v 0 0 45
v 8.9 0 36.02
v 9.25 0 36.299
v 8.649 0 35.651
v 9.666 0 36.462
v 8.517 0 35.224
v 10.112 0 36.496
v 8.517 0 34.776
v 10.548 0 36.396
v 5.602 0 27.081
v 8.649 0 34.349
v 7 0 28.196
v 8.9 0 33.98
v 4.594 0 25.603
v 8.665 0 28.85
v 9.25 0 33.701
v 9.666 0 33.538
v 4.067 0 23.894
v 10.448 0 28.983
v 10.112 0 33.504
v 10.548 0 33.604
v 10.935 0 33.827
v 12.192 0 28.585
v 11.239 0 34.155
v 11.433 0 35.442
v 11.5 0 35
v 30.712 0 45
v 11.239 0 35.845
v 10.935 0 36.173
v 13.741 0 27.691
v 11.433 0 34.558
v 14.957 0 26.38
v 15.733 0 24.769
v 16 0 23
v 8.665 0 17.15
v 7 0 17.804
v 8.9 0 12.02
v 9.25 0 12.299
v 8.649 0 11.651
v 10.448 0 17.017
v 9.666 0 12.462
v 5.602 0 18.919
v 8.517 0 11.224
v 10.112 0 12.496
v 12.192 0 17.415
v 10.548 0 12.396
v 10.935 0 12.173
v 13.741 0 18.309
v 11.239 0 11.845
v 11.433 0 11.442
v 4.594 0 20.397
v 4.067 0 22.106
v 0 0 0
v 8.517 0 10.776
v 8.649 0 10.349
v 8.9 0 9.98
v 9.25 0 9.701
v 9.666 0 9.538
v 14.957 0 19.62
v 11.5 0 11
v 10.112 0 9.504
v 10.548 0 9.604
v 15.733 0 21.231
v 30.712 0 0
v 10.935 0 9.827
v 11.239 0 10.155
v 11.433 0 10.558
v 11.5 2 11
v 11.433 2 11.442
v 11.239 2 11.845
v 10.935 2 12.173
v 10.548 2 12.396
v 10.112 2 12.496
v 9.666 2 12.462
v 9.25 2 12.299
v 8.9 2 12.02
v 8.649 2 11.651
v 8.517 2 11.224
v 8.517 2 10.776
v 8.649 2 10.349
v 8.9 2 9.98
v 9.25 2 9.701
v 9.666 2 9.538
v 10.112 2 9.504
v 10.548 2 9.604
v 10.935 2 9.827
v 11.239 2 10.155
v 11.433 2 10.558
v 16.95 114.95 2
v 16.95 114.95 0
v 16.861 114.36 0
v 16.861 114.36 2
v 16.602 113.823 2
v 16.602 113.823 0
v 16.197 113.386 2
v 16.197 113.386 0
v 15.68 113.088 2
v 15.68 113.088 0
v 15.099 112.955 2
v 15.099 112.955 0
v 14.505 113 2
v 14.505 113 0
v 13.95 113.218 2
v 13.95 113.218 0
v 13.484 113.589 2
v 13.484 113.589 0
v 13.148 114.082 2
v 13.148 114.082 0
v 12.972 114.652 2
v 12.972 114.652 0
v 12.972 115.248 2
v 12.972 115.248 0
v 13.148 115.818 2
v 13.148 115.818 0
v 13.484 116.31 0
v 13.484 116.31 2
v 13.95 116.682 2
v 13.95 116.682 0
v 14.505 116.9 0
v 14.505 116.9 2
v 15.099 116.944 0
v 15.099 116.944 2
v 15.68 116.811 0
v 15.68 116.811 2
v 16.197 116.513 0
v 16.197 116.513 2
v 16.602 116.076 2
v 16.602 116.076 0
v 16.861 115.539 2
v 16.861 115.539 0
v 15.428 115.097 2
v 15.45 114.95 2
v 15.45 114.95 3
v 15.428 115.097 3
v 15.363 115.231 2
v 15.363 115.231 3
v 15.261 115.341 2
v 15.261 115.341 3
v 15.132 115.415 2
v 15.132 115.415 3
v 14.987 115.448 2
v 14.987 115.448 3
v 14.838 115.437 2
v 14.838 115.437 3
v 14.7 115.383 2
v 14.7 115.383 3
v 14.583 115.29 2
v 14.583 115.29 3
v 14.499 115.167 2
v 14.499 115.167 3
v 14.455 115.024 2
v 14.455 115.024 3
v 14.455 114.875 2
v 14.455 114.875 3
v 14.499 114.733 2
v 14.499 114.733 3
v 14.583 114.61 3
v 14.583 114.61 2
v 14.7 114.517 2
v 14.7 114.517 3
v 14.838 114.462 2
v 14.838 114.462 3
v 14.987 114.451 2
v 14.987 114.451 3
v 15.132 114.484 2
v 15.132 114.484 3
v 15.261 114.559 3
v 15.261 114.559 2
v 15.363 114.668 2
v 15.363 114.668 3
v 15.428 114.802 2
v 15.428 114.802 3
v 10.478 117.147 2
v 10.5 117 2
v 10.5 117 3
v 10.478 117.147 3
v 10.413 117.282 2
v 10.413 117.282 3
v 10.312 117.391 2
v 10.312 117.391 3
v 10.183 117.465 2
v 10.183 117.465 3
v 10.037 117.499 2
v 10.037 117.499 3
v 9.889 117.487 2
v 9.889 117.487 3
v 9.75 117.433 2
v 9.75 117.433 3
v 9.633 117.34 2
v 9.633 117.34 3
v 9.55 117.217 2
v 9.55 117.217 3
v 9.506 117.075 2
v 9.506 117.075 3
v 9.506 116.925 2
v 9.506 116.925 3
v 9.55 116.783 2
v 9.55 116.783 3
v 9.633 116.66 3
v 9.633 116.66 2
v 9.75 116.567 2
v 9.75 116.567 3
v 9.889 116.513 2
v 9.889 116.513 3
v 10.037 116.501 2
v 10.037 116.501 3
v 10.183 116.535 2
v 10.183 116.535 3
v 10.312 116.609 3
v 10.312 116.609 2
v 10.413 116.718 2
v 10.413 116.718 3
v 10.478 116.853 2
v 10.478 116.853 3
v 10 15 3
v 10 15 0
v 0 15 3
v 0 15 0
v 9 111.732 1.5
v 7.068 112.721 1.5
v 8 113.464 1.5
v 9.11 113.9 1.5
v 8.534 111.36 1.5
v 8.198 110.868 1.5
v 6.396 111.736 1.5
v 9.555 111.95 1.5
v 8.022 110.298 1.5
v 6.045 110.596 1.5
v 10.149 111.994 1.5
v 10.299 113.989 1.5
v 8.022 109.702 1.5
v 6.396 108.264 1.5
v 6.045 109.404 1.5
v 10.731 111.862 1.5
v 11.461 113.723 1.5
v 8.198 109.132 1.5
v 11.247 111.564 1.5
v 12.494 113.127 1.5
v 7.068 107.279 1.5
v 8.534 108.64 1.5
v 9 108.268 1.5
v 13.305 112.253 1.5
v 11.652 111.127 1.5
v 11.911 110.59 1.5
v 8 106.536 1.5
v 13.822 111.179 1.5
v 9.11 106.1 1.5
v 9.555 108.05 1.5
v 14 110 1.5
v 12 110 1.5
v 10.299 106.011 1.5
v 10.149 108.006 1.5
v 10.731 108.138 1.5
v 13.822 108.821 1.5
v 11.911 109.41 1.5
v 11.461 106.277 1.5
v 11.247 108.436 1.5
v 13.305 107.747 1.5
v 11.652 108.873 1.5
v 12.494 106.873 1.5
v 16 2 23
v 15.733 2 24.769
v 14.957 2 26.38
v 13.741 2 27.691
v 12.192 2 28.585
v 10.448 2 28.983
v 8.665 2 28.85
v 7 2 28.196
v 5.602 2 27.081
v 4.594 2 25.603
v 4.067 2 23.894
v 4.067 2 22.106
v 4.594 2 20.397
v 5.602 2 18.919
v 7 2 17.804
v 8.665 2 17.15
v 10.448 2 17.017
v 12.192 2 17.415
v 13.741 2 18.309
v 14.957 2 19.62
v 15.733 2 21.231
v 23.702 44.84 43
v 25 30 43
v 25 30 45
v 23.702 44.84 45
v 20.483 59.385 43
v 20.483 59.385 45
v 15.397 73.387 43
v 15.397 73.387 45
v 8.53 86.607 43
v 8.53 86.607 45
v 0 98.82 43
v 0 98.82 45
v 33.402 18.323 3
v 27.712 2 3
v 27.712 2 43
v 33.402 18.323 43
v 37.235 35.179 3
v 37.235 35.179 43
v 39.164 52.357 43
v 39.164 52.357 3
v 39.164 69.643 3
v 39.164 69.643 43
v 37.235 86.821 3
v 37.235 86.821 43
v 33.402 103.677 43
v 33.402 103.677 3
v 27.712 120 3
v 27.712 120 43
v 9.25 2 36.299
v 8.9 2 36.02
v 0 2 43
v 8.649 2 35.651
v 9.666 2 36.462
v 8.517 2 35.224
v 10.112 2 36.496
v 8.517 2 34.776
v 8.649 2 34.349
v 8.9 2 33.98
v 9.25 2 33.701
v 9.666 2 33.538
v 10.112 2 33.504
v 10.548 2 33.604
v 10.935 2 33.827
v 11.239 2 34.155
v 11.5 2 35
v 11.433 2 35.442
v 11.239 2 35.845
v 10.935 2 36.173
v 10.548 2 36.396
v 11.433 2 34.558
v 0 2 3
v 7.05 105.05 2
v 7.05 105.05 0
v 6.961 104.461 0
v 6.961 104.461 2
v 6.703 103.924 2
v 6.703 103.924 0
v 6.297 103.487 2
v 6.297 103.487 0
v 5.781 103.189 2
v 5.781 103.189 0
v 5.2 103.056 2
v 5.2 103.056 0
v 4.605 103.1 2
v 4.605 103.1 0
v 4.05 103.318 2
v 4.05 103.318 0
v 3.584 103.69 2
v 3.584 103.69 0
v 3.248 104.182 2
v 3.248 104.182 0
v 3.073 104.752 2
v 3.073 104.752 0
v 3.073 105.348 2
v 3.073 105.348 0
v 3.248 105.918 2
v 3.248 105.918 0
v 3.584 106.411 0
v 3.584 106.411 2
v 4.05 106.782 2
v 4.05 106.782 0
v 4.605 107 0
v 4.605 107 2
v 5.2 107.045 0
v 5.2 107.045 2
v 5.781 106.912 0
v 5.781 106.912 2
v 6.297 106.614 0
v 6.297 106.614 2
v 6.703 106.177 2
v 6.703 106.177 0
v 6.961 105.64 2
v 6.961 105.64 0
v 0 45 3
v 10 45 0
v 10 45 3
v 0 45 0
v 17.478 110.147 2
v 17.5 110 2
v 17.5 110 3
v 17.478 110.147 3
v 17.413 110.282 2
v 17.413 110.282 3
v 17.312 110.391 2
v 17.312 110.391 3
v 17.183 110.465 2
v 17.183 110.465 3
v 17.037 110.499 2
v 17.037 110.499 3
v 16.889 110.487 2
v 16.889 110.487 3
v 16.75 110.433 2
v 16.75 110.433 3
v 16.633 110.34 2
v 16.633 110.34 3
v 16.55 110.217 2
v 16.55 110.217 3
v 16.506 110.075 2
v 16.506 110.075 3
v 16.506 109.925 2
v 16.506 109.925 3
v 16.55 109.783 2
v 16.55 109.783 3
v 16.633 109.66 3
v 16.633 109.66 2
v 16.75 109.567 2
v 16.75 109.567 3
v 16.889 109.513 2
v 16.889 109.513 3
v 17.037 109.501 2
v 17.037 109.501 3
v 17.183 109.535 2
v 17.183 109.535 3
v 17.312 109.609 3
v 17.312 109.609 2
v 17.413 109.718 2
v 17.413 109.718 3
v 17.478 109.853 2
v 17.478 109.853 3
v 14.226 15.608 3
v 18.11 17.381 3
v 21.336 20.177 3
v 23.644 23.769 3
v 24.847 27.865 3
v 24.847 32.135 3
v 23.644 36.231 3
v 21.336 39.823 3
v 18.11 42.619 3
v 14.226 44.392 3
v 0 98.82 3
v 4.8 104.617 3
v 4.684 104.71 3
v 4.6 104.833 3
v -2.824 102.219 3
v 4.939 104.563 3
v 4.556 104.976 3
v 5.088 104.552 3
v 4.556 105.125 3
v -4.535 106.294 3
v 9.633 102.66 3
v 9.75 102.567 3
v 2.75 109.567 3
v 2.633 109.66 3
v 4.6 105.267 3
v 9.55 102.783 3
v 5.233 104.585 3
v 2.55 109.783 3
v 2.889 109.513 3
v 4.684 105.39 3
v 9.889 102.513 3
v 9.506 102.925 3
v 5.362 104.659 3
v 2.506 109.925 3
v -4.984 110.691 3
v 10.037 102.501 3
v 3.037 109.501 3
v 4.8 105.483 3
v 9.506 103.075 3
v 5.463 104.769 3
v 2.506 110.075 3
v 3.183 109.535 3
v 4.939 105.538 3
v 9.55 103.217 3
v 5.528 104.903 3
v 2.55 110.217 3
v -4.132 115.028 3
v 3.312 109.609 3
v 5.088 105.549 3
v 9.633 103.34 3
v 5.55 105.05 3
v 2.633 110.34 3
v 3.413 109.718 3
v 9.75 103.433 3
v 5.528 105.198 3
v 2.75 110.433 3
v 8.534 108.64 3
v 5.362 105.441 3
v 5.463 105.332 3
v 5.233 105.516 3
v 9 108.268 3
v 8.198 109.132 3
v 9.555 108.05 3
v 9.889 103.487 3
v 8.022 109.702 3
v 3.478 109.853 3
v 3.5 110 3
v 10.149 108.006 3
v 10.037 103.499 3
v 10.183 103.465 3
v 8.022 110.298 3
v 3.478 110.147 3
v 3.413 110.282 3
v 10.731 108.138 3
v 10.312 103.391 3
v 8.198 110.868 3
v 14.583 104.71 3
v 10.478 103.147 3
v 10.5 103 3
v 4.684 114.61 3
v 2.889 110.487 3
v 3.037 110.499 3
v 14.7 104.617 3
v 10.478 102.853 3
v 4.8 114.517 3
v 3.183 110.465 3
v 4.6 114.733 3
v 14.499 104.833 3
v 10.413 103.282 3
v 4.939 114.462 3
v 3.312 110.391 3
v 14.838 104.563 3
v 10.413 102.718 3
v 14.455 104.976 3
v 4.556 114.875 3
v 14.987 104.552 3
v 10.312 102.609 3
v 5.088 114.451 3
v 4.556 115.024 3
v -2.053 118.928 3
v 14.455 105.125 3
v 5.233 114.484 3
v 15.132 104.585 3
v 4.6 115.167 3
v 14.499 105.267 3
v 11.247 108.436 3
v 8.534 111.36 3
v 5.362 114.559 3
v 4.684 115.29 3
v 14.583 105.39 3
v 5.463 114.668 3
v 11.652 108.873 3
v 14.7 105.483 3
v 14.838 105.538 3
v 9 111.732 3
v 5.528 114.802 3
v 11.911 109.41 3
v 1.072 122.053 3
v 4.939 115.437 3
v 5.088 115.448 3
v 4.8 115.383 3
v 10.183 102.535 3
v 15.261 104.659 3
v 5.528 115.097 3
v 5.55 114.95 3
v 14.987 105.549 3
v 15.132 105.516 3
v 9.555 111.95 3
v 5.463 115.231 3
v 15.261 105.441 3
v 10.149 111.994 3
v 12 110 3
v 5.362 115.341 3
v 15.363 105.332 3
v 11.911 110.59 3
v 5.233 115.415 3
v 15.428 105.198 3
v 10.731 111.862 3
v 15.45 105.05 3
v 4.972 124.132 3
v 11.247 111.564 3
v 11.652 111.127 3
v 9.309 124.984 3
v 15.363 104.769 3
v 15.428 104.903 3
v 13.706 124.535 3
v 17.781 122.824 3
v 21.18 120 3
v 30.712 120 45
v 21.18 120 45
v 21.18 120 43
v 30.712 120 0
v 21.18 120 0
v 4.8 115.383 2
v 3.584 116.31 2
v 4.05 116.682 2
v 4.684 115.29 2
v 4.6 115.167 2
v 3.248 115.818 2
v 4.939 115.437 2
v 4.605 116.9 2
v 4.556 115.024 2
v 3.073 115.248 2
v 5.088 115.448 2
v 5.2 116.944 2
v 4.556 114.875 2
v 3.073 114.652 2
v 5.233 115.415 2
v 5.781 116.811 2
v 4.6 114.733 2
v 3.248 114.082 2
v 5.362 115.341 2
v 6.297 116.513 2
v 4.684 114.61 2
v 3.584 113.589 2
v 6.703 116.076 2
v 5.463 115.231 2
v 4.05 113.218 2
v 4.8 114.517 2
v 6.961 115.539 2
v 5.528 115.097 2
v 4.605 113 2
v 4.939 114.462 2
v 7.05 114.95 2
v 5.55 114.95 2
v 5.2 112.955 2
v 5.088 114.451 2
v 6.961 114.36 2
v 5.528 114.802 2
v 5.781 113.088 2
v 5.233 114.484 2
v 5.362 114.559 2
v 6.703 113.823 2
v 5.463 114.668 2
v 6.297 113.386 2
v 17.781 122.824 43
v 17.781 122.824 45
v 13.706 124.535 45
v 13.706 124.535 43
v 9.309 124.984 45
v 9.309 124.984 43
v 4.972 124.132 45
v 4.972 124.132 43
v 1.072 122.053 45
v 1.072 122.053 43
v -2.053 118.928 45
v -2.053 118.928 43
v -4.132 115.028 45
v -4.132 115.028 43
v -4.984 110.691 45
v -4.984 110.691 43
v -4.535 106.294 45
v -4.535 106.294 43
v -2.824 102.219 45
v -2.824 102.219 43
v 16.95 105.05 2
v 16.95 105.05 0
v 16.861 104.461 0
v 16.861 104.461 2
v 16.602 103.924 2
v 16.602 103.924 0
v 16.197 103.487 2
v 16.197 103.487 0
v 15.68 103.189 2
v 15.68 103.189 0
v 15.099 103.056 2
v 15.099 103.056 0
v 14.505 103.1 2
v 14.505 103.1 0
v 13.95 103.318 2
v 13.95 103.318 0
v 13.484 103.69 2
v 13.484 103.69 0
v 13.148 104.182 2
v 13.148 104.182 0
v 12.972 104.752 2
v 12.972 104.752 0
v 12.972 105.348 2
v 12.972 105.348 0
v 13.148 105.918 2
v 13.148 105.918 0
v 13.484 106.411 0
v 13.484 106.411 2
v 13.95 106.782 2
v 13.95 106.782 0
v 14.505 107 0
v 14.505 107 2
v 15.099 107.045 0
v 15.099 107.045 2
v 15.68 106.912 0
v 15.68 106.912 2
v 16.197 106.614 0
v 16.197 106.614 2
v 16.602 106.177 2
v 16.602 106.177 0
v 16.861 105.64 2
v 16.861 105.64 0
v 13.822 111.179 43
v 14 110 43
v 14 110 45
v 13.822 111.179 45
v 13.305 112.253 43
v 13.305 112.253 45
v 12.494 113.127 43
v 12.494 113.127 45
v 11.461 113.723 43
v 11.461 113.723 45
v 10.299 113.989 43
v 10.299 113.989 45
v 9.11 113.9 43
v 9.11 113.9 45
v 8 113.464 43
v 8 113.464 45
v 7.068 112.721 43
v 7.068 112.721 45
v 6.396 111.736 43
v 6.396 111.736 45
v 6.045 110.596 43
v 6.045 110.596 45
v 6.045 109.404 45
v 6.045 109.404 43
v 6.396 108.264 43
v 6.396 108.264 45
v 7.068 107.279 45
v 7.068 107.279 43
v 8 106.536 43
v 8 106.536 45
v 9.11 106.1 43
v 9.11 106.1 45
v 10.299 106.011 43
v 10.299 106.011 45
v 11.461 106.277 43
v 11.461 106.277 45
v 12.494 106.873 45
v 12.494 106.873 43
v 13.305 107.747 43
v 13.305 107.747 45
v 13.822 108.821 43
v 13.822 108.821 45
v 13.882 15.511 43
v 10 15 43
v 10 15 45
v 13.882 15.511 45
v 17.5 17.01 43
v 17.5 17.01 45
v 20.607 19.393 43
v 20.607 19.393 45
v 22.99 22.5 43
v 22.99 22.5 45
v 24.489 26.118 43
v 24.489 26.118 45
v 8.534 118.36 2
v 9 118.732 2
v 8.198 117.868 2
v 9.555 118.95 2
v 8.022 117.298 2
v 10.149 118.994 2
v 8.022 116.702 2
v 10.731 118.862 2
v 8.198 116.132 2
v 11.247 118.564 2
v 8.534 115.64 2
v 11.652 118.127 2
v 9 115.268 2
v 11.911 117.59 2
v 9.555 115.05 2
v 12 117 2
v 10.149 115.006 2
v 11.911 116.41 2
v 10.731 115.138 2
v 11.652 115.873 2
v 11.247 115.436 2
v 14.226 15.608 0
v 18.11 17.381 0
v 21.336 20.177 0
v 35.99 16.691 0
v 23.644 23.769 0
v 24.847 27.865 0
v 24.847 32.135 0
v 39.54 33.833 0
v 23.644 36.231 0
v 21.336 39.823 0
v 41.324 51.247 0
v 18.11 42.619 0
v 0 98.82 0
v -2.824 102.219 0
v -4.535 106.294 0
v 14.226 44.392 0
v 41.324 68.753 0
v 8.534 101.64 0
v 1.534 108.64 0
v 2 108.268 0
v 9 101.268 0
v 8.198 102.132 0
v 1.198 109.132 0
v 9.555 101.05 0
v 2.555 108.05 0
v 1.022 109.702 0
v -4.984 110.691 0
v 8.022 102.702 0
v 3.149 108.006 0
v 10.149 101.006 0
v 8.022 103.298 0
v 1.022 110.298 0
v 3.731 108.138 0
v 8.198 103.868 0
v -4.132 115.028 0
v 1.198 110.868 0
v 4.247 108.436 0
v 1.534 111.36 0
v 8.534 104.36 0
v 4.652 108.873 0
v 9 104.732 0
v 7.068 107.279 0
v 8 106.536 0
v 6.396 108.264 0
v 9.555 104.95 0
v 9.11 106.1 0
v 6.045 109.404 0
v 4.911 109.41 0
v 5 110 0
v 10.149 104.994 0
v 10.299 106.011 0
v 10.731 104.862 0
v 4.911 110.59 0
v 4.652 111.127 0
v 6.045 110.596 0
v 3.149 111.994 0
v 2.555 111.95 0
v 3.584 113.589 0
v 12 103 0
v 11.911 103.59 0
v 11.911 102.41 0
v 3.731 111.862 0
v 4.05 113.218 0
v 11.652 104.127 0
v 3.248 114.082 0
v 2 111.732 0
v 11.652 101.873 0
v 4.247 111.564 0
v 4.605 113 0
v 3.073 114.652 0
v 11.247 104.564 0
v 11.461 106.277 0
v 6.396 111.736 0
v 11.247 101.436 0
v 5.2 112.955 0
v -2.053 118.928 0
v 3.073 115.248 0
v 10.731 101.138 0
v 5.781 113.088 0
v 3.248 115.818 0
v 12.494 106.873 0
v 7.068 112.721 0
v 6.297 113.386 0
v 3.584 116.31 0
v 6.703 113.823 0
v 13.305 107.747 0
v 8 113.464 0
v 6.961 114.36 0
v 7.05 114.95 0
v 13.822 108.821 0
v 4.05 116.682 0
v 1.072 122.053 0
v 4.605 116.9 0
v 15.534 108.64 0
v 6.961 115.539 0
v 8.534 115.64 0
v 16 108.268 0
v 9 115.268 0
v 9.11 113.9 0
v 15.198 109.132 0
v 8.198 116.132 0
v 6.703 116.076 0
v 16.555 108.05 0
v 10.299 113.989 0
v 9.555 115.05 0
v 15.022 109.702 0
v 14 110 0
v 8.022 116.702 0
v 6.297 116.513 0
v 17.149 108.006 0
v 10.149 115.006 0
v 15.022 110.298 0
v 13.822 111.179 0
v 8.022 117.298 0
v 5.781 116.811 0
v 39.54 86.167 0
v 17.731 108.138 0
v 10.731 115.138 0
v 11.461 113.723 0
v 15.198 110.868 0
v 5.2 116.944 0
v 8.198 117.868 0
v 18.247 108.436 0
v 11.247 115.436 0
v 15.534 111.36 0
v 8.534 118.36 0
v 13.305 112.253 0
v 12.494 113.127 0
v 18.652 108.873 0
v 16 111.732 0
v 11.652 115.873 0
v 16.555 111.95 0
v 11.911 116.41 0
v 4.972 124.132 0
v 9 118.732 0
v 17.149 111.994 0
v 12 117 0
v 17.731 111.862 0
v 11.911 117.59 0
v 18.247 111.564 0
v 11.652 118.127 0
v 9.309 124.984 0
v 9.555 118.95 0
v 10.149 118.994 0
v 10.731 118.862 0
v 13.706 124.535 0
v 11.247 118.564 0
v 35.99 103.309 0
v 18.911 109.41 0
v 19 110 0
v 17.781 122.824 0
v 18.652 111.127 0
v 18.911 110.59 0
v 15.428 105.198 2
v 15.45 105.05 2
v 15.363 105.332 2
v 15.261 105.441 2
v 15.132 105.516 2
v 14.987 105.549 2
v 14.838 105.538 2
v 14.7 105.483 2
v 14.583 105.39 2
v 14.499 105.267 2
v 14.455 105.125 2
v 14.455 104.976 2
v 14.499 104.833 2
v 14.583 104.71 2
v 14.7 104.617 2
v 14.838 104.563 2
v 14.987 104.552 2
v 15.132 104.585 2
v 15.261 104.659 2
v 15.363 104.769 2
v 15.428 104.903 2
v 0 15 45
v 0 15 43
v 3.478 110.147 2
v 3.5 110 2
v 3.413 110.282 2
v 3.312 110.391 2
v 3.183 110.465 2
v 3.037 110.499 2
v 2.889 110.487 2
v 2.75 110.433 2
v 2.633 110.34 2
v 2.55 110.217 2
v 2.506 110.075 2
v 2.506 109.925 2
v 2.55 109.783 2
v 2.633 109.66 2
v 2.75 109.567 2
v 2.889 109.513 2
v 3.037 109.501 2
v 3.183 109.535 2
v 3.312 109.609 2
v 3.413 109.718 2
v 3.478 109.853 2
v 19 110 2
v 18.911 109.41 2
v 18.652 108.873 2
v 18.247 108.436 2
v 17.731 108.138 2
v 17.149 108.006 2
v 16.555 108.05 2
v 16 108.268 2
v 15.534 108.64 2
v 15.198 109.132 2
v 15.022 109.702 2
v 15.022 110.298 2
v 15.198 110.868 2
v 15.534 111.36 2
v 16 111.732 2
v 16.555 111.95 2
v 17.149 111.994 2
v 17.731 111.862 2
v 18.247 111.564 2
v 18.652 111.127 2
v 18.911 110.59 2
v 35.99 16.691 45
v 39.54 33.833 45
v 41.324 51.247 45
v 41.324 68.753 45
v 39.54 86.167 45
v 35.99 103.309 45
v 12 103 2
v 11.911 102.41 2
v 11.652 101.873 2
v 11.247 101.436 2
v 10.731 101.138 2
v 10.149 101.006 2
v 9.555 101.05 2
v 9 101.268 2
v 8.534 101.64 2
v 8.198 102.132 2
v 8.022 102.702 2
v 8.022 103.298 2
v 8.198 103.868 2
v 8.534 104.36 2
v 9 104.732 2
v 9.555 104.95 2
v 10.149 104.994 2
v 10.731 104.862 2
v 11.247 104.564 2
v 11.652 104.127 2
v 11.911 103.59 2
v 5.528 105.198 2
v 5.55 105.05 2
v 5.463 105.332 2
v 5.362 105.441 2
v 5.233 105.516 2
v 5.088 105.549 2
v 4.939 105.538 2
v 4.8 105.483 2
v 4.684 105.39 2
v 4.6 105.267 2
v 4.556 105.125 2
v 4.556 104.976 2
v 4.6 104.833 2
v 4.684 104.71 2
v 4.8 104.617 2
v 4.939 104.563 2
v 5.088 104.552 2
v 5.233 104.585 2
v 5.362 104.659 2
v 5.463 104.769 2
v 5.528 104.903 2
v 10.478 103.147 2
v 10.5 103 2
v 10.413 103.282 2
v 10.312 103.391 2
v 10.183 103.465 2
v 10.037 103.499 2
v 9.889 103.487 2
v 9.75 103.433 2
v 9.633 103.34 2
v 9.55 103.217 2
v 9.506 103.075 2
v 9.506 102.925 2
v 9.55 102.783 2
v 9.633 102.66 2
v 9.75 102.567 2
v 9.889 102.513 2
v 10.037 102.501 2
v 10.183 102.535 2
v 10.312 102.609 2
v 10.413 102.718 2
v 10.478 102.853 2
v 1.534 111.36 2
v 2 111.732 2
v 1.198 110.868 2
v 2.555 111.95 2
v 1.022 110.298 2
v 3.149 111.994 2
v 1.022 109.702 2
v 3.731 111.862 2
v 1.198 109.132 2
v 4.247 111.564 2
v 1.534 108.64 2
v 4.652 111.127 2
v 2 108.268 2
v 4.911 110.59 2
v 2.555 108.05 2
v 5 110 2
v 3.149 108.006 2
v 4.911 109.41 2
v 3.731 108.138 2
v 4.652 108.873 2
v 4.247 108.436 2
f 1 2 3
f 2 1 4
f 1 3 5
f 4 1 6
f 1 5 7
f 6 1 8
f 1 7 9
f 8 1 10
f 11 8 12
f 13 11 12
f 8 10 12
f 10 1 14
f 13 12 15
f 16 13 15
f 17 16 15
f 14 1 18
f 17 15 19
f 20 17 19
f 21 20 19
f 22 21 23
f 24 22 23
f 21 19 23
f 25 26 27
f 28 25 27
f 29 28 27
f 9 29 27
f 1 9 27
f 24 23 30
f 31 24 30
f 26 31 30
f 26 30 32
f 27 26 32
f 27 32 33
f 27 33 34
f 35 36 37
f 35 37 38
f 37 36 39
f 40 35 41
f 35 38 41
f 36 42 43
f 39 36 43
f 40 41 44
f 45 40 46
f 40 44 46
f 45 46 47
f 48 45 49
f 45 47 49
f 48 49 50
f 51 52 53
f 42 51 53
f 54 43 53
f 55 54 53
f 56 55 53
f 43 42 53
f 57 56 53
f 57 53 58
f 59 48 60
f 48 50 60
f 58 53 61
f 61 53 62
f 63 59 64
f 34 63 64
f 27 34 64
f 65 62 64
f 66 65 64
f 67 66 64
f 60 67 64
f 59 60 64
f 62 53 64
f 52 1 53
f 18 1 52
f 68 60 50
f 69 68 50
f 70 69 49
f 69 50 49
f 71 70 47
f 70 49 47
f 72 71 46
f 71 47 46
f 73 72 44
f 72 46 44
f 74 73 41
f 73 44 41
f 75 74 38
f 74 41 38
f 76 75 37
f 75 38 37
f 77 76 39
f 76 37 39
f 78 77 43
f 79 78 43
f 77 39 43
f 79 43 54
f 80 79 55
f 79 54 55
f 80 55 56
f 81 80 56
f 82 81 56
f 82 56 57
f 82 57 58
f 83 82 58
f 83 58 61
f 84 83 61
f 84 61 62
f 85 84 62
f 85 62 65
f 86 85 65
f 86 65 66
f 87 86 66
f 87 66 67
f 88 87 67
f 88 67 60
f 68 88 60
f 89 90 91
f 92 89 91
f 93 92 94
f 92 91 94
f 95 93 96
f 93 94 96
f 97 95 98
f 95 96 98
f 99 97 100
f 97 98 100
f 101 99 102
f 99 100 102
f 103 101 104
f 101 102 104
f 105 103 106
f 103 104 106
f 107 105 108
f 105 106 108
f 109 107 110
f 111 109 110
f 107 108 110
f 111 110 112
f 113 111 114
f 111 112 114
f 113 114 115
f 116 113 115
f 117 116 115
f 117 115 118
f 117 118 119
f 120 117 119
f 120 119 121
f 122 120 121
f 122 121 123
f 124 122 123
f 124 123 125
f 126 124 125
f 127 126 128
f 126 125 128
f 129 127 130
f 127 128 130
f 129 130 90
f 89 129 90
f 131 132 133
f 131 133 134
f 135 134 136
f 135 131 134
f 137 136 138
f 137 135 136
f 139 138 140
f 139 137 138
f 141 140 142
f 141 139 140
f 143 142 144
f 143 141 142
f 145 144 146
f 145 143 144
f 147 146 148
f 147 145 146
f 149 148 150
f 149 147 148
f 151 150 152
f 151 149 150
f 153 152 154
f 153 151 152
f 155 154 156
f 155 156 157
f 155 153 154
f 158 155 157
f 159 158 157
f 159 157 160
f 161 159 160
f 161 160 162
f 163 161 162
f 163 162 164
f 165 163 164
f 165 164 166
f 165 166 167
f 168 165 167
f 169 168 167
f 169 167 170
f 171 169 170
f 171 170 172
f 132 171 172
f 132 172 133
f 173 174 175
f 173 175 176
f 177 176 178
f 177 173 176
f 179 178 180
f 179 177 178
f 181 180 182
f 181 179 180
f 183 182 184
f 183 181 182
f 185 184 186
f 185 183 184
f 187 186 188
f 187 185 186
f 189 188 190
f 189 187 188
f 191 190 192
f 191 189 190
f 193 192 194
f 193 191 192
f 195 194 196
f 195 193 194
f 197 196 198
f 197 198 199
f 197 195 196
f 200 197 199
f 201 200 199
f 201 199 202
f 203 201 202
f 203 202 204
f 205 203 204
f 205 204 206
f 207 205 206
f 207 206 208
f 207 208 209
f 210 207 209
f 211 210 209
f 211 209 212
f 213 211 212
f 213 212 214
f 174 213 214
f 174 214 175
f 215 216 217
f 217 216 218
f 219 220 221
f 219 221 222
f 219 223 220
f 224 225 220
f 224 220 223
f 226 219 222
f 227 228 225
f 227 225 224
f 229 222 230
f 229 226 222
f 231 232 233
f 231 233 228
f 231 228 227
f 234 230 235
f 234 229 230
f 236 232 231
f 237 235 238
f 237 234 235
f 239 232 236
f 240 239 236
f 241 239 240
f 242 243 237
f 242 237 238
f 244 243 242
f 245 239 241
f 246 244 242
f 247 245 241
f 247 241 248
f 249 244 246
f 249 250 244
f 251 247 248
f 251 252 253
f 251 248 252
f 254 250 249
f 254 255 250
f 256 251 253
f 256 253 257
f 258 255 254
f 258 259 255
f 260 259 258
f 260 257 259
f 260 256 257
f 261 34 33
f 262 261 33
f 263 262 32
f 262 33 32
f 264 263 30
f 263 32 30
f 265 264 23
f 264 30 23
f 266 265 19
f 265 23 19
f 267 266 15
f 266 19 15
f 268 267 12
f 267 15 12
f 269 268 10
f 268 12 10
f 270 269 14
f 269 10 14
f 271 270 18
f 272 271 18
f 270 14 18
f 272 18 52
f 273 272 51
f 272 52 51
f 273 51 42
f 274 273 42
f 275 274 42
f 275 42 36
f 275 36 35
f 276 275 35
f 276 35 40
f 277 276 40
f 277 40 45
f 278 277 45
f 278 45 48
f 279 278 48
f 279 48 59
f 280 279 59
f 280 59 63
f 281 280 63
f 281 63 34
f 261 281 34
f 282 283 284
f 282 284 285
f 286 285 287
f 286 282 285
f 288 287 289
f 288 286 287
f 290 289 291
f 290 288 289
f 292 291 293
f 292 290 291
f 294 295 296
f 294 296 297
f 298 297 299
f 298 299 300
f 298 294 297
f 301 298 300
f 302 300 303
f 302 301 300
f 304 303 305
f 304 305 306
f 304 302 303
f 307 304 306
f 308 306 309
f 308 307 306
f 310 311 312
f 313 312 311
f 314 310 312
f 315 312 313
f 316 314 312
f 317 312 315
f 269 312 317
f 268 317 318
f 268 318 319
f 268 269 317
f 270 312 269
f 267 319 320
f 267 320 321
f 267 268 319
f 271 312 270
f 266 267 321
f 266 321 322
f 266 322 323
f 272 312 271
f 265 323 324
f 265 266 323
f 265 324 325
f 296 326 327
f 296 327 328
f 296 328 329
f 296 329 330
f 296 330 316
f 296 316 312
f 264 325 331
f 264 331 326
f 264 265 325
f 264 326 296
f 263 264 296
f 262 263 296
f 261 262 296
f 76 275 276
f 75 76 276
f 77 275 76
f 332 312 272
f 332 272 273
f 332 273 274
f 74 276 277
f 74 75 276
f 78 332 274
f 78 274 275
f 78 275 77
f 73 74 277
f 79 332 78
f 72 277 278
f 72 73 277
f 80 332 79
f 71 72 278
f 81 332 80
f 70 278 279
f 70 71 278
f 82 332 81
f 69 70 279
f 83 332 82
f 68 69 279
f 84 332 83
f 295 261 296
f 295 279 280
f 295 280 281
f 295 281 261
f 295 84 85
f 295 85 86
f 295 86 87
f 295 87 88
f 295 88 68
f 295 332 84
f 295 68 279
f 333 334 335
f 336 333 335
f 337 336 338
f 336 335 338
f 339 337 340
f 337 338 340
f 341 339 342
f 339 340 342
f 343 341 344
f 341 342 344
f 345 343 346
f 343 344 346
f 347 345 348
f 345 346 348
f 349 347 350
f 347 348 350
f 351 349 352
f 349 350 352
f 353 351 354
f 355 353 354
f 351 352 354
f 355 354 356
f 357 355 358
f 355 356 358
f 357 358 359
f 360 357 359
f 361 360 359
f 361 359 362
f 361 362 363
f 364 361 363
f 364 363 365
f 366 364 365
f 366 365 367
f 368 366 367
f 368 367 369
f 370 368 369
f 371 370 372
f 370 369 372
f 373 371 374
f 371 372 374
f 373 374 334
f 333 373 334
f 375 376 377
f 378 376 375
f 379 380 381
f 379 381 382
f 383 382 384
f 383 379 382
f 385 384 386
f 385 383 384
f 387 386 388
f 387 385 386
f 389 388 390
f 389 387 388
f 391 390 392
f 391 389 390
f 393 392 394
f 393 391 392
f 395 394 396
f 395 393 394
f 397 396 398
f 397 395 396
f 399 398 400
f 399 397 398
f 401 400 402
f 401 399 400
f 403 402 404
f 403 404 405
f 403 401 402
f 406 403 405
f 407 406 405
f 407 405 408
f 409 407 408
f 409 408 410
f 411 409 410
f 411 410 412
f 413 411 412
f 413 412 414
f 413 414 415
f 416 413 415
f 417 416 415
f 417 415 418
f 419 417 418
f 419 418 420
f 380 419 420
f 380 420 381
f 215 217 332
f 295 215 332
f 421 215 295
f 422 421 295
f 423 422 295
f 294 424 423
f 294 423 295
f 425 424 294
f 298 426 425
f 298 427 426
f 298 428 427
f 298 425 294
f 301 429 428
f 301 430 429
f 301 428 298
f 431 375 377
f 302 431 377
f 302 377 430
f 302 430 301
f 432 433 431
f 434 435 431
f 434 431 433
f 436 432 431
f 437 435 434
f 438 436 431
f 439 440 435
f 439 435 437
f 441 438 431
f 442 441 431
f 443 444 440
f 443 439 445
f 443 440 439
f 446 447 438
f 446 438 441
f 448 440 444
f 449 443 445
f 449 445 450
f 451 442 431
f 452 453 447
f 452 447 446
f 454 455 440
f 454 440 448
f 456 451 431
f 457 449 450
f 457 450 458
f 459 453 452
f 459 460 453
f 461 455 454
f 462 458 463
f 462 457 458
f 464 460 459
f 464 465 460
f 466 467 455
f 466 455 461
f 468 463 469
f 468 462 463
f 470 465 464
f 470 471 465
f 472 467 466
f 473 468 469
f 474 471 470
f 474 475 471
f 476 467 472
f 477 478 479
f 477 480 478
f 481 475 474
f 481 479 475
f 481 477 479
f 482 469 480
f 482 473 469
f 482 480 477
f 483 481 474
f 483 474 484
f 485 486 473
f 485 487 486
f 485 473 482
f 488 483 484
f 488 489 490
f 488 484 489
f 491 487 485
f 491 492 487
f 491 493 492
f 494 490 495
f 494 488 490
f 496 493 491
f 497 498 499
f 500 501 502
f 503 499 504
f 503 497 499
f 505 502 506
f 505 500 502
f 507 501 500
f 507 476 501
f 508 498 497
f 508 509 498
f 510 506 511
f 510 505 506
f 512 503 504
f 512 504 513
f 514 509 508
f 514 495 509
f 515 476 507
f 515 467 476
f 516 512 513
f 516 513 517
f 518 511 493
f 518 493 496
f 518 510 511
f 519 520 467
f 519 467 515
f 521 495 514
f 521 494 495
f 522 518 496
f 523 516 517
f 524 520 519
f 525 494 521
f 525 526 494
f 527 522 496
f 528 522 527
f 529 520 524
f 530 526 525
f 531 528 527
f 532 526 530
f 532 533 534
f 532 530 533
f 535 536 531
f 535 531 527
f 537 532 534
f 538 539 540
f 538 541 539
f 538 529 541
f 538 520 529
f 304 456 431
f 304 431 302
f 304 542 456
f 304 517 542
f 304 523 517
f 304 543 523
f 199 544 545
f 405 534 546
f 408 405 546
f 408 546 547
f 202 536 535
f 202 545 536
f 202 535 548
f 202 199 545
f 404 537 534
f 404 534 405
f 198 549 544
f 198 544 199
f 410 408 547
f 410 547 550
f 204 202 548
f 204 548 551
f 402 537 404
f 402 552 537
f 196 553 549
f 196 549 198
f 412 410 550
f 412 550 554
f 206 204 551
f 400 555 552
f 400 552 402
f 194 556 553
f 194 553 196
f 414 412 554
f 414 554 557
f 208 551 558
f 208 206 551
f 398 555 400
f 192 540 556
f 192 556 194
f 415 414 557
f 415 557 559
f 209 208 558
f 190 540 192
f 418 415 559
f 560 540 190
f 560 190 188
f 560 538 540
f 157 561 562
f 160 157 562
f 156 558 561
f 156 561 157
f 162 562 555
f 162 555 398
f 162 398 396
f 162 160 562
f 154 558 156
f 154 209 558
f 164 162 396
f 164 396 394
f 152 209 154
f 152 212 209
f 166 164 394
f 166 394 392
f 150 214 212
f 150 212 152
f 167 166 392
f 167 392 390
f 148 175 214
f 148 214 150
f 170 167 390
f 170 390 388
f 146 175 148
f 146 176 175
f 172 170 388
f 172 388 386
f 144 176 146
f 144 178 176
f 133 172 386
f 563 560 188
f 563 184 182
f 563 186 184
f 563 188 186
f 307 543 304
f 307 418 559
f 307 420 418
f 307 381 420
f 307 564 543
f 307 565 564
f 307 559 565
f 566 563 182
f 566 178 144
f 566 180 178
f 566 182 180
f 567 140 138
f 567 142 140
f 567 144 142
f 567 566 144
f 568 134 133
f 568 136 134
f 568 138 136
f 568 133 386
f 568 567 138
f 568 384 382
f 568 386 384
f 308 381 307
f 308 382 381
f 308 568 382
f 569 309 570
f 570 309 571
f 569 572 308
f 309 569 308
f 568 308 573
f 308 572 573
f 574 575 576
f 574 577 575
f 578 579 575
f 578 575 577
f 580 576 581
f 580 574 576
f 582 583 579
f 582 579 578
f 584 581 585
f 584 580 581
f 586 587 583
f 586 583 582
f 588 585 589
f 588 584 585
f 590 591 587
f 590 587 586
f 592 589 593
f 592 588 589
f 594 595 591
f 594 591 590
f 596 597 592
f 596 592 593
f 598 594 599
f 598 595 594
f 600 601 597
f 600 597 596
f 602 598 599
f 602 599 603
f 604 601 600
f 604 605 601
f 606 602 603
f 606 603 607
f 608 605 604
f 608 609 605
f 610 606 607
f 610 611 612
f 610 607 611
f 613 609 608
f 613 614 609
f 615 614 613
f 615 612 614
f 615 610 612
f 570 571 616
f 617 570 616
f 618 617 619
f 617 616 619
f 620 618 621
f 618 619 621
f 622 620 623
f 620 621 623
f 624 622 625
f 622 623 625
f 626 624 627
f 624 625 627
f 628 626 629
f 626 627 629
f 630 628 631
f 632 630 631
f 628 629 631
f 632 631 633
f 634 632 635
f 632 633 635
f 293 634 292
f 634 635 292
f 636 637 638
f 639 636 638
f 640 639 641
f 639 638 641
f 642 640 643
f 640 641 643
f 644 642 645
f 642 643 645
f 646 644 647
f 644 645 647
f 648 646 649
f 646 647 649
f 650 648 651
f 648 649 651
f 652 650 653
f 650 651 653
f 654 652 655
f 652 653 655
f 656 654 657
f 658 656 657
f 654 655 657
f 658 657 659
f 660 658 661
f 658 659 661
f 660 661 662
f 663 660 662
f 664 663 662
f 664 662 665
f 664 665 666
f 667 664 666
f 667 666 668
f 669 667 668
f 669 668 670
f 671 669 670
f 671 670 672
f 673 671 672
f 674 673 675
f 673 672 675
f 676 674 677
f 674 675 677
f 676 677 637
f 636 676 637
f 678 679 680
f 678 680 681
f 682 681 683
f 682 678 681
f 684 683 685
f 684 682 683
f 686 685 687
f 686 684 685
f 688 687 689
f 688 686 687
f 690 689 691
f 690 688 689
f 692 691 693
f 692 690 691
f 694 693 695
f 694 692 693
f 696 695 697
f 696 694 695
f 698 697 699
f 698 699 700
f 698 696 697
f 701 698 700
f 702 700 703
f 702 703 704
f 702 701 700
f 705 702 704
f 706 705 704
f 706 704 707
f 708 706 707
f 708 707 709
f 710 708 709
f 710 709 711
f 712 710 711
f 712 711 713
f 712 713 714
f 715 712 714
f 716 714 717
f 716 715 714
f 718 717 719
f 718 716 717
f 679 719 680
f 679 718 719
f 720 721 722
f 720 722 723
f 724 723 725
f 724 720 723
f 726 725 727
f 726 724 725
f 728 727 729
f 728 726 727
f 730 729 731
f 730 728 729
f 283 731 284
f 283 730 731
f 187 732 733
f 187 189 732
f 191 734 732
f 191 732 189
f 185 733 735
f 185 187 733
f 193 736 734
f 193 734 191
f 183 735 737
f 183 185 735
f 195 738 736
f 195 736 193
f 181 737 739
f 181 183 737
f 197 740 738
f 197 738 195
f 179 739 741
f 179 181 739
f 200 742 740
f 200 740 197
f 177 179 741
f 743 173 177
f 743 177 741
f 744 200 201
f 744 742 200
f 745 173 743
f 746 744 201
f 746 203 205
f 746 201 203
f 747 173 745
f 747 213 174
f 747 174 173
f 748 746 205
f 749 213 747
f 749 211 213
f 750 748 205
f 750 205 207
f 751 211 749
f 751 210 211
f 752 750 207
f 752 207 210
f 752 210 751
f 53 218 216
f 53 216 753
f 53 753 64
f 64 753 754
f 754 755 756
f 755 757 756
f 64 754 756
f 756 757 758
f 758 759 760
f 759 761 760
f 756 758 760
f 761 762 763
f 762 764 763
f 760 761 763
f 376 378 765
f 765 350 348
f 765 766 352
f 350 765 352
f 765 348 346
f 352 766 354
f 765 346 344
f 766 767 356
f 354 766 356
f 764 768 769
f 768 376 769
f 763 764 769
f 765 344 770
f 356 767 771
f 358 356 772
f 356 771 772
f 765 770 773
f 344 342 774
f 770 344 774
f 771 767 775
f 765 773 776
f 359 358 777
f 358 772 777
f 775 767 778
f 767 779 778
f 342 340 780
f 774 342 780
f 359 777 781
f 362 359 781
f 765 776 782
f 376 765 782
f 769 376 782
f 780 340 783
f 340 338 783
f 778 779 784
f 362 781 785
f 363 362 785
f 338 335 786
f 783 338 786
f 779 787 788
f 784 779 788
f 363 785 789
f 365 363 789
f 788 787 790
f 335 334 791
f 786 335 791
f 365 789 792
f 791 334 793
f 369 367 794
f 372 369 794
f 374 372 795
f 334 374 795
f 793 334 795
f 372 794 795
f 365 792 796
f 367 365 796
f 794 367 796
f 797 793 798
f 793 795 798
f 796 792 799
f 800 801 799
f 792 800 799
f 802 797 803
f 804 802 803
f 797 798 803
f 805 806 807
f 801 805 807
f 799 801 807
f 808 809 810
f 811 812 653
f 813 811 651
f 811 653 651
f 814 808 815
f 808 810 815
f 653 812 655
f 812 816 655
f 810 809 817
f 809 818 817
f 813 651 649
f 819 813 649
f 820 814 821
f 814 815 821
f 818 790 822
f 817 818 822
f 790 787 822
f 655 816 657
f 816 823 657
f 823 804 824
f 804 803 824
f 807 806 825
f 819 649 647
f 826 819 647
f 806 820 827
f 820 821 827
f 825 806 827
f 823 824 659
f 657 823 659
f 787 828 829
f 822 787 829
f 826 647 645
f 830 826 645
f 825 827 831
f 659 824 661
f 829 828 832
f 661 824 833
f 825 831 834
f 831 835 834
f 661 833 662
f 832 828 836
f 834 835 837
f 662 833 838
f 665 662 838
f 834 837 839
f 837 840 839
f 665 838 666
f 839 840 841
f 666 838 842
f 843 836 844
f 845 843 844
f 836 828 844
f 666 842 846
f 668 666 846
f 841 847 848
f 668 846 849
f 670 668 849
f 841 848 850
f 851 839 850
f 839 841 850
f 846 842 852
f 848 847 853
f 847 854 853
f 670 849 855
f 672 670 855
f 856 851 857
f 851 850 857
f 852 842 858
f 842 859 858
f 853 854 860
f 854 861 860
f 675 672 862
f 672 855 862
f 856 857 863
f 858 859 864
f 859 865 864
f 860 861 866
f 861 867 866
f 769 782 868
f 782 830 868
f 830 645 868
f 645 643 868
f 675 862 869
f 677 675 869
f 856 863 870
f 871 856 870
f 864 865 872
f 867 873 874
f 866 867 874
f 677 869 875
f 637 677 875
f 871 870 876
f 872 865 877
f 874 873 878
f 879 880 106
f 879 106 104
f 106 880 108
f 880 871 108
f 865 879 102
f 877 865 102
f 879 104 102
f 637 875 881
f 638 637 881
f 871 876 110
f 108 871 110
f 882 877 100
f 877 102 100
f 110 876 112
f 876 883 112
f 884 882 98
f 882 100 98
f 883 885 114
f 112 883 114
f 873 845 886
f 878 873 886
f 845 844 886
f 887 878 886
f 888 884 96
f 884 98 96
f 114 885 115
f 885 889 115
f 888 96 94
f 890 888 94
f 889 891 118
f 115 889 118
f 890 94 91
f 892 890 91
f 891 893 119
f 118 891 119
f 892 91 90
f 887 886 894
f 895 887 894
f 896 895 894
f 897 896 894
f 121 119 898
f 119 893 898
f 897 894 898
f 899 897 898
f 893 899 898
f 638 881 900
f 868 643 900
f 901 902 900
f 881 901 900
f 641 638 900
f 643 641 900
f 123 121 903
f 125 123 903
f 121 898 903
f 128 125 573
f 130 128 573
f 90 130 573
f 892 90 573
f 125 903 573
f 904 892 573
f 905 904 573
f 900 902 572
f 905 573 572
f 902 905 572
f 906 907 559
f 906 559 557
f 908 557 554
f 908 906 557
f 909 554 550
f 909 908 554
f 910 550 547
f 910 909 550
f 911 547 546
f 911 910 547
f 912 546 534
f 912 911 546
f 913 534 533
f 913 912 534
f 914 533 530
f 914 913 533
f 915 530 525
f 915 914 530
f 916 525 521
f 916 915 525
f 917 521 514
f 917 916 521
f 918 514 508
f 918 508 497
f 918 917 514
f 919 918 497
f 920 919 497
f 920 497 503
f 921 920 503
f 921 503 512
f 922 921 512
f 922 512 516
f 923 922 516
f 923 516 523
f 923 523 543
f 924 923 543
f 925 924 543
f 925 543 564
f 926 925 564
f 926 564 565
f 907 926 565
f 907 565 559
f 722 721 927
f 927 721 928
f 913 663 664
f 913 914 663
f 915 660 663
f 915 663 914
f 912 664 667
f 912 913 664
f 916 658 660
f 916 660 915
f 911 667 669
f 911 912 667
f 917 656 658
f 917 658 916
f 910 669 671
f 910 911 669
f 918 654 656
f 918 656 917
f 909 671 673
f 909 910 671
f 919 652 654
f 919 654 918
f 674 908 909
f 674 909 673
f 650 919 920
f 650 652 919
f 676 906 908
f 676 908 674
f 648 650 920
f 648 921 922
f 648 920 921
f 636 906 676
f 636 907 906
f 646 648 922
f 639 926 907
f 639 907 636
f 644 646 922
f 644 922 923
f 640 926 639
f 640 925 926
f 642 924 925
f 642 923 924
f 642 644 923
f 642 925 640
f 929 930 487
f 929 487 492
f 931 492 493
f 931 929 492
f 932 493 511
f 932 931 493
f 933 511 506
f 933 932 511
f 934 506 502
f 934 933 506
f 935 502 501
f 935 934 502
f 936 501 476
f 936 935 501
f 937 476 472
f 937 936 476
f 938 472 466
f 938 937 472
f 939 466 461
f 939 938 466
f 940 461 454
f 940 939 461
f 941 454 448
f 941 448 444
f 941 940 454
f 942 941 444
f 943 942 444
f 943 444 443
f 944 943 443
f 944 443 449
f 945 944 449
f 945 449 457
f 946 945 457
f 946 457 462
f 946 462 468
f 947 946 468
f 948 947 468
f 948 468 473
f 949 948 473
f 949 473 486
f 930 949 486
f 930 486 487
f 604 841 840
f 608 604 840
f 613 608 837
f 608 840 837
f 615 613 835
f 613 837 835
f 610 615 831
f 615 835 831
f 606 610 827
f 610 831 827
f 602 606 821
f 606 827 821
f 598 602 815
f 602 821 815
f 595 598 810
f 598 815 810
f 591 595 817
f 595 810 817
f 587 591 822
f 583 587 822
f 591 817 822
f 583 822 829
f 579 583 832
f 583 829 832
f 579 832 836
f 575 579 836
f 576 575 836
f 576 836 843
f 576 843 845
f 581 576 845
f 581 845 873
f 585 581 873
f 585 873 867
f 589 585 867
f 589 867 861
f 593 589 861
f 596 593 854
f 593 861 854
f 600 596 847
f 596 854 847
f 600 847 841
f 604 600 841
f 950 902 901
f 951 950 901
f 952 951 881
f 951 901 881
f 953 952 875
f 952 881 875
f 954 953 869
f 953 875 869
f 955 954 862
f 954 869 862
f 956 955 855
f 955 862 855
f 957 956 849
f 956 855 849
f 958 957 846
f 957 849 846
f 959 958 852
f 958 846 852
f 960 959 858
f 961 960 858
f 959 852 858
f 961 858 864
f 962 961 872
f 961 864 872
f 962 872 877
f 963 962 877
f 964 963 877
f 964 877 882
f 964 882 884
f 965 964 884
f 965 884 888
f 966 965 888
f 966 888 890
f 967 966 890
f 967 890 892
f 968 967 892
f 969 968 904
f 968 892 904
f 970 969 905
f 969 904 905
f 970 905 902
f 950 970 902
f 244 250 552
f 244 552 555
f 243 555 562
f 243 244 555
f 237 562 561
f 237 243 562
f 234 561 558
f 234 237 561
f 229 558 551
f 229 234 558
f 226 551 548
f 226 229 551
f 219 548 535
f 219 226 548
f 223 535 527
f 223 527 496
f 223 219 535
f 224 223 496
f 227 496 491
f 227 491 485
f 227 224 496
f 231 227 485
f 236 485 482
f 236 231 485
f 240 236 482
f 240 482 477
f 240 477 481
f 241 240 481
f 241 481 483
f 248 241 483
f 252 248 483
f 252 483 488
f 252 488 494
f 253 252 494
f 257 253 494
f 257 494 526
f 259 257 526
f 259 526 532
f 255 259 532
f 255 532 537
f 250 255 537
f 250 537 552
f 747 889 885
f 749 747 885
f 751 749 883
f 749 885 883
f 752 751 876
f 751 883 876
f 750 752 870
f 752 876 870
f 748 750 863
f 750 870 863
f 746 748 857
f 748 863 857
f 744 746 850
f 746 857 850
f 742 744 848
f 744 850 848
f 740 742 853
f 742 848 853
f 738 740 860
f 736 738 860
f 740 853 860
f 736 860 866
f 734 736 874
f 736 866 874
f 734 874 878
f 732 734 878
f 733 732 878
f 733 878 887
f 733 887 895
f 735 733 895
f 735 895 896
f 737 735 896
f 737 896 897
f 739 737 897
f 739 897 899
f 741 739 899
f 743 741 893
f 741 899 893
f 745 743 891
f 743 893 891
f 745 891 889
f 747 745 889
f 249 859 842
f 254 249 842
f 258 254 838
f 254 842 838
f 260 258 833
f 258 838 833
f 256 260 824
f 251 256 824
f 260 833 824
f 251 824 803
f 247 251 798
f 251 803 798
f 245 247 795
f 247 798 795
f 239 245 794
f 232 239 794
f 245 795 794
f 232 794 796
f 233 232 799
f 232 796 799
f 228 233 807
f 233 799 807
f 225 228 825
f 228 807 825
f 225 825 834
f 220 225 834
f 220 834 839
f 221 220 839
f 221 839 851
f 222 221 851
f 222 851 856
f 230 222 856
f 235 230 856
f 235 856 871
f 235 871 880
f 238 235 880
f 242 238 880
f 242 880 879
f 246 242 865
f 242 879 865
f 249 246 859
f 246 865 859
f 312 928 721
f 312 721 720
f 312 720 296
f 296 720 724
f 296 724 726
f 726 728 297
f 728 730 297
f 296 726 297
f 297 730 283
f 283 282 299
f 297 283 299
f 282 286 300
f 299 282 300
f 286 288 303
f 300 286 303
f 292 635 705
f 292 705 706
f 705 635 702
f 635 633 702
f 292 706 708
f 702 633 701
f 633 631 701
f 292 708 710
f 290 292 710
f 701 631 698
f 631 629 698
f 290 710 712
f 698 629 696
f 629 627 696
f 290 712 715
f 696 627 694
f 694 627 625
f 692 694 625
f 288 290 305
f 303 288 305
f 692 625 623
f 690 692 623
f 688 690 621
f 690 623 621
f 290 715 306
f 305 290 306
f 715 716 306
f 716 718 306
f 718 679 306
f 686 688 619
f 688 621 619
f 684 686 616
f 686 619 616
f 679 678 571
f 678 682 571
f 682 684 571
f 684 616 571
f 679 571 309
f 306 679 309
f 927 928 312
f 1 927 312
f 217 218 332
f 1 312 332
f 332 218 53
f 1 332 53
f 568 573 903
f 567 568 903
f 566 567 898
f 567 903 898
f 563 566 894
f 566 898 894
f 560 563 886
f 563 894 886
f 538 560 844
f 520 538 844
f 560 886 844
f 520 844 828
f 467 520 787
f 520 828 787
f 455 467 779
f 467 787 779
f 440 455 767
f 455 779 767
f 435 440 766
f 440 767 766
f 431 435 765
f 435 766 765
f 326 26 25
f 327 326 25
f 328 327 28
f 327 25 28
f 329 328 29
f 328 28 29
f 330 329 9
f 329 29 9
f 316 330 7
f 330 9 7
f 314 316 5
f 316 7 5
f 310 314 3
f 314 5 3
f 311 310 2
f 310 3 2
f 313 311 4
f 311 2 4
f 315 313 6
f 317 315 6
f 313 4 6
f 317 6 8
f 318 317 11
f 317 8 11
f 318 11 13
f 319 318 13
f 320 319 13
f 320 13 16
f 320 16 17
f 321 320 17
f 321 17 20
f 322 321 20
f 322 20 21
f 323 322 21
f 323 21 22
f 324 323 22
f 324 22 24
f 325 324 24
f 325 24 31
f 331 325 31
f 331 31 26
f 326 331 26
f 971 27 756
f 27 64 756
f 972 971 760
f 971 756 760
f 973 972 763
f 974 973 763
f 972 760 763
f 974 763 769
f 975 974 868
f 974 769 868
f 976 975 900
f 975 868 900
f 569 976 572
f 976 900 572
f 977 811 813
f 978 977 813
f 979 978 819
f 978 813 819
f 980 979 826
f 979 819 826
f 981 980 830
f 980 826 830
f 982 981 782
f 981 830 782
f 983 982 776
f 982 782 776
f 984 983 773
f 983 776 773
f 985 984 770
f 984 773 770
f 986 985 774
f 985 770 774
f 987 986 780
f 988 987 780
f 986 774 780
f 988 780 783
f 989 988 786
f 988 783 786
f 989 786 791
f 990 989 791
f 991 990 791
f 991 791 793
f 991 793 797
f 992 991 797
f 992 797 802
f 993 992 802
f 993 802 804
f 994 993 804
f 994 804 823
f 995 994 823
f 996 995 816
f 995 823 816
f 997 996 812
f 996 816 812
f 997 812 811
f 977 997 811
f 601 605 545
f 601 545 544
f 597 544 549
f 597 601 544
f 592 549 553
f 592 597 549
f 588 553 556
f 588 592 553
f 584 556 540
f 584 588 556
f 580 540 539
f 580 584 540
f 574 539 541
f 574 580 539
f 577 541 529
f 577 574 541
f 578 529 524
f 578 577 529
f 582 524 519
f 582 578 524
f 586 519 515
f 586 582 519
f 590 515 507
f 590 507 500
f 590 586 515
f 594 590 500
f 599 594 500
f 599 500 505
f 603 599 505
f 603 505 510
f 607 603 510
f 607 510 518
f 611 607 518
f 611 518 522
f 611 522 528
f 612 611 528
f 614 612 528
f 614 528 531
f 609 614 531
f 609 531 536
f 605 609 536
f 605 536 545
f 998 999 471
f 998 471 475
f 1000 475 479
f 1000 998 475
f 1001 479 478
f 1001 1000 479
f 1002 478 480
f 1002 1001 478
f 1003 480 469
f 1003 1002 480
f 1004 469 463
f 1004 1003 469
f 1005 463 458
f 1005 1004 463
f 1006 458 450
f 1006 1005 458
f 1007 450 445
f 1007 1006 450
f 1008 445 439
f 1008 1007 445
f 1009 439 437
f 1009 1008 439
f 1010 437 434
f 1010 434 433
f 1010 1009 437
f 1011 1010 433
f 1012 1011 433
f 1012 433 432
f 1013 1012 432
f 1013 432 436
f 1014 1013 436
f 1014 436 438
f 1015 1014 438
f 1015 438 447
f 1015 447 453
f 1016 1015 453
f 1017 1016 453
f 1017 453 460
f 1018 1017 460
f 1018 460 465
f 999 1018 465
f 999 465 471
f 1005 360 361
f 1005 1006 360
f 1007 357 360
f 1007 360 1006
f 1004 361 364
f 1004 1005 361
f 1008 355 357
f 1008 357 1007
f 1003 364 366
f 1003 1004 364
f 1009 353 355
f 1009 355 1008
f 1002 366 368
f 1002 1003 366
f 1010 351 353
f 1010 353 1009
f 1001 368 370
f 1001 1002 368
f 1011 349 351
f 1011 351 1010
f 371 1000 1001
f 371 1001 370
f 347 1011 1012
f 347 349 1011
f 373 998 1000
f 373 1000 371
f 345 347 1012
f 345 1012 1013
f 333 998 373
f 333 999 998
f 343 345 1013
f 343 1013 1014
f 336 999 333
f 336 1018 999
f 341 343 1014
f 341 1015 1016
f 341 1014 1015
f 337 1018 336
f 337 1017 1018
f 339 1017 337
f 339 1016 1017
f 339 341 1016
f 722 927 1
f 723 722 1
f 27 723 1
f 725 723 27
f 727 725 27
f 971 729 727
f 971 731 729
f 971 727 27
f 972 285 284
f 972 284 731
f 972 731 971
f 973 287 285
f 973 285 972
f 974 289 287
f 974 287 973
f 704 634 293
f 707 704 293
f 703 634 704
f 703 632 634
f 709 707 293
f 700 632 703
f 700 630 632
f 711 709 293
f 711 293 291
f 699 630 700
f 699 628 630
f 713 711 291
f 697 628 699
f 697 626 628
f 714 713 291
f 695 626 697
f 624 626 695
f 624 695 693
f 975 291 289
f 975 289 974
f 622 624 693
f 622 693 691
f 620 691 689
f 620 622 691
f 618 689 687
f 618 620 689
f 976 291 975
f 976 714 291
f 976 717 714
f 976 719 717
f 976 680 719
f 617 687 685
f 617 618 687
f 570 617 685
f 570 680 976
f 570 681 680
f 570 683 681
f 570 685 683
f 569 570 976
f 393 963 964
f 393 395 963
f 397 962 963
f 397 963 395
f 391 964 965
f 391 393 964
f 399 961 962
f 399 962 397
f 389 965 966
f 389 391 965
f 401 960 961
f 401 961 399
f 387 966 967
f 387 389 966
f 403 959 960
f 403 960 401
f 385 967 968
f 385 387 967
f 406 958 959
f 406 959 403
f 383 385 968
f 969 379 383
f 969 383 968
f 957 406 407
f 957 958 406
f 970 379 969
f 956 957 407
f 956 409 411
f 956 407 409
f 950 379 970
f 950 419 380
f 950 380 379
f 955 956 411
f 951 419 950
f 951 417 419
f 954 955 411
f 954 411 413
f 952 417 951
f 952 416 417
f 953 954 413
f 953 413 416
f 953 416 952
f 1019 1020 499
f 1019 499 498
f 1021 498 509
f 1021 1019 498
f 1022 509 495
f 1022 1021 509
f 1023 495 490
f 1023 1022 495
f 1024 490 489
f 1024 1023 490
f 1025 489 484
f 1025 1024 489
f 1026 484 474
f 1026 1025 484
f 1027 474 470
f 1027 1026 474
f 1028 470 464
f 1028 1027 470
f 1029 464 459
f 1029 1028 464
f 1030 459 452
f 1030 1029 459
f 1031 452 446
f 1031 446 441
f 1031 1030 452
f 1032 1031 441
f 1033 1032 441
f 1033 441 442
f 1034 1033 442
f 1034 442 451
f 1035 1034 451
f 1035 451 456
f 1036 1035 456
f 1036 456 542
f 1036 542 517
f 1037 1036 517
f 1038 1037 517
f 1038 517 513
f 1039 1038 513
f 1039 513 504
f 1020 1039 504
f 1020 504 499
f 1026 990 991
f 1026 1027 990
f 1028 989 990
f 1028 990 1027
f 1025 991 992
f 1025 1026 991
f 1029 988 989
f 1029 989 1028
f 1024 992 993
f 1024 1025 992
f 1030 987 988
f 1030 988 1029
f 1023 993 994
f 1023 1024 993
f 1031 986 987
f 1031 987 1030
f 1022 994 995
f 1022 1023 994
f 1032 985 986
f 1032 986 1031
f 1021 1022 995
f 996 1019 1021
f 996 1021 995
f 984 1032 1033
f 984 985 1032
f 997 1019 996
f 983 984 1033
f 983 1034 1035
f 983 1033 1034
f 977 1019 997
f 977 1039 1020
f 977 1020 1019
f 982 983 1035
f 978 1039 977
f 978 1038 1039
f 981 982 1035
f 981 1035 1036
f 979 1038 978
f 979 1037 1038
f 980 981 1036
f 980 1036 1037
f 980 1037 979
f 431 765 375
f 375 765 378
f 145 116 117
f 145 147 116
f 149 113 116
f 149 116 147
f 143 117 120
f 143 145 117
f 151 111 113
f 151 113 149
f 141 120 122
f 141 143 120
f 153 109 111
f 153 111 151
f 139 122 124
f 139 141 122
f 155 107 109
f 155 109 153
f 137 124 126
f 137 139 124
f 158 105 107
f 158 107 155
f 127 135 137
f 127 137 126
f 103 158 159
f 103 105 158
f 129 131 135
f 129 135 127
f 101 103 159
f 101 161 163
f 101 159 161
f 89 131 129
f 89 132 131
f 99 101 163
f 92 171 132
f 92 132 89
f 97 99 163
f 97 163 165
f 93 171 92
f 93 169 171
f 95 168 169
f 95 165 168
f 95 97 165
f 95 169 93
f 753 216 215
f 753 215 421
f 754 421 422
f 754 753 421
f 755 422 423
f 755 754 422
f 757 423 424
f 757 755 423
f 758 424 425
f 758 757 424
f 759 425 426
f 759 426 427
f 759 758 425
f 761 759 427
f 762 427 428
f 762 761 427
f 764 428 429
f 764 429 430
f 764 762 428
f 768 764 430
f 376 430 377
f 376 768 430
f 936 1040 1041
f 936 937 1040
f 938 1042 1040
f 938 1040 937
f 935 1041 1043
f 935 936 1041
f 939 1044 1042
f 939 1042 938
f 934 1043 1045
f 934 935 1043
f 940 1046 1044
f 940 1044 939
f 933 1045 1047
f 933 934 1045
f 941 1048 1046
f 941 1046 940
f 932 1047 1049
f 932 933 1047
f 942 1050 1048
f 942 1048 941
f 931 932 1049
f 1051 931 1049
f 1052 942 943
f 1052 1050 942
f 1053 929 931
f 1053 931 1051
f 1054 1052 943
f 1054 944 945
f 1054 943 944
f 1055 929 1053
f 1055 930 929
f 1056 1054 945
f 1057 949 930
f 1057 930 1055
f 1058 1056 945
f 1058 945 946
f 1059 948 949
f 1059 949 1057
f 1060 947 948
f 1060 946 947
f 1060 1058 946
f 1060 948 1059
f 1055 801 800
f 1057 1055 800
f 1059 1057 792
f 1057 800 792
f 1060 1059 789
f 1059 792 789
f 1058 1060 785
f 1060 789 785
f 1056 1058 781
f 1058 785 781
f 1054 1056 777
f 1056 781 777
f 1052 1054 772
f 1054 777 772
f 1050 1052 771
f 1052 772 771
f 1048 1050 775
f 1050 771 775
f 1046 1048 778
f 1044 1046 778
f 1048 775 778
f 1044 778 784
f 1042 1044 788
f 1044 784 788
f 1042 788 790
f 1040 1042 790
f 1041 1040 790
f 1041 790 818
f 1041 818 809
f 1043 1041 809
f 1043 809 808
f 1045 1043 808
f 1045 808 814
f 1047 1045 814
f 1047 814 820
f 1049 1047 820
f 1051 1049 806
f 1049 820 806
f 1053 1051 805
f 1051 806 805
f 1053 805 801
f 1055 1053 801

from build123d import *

# Parameters (mm, degrees)
SKETCH_R        = 2
SKETCH_R_2      = 0.5
PAD_DEPTH       = 3
SKETCH003_R     = 2
POCKET_DEPTH    = 2
PAD001_DEPTH    = 40
SKETCH001_R     = 4
PAD002_DEPTH    = 2
SKETCH004_R     = 6
SKETCH004_R_2   = 1.5
POCKET001_DEPTH = 5
SKETCH005_R     = 4
POCKET002_DEPTH = 1.5


with BuildPart() as part:
    # Sketch → Pad (new body)
    with BuildSketch(Plane.XY):
        with BuildLine():
            Line((0, 0), (30.712315, 0))
            ThreePointArc((30.712315, 0), (41.547219, 60), (30.712315, 120))
            Line((21.18034, 120), (30.712315, 120))
            ThreePointArc((21.18034, 120), (-0.606602, 120.606602), (0, 98.81966))
            Line((0, 98.81966), (0, 45))
            Line((10, 45), (0, 45))
            ThreePointArc((10, 15), (25, 30), (10, 45))
            Line((10, 15), (0, 15))
            Line((0, 15), (0, 0))
        make_face()
        with Locations((10, 110)):
            Circle(SKETCH_R, mode=Mode.SUBTRACT)
        with Locations((10, 117)):
            Circle(SKETCH_R_2, mode=Mode.SUBTRACT)
        with Locations((17, 110)):
            Circle(SKETCH_R_2, mode=Mode.SUBTRACT)
        with Locations((10, 103)):
            Circle(SKETCH_R_2, mode=Mode.SUBTRACT)
        with Locations((3, 110)):
            Circle(SKETCH_R_2, mode=Mode.SUBTRACT)
        with Locations((14.949747, 114.949747)):
            Circle(SKETCH_R_2, mode=Mode.SUBTRACT)
        with Locations((14.949747, 105.050253)):
            Circle(SKETCH_R_2, mode=Mode.SUBTRACT)
        with Locations((5.050253, 105.050253)):
            Circle(SKETCH_R_2, mode=Mode.SUBTRACT)
        with Locations((5.050253, 114.949747)):
            Circle(SKETCH_R_2, mode=Mode.SUBTRACT)
    extrude(amount=PAD_DEPTH)

    # Sketch003 → Pocket (cut)
    with BuildSketch(Plane(origin=(0, 0, 0), x_dir=(1, 0, 0), z_dir=(0, 0, -1))):
        with Locations((5.050253, -114.949747)):
            Circle(SKETCH003_R)
        with Locations((5.050253, -105.050253)):
            Circle(SKETCH003_R)
        with Locations((14.949747, -105.050253)):
            Circle(SKETCH003_R)
        with Locations((14.949747, -114.949747)):
            Circle(SKETCH003_R)
        with Locations((10, -103)):
            Circle(SKETCH003_R)
        with Locations((17, -110)):
            Circle(SKETCH003_R)
        with Locations((10, -117)):
            Circle(SKETCH003_R)
        with Locations((3, -110)):
            Circle(SKETCH003_R)
    extrude(amount=-POCKET_DEPTH, mode=Mode.SUBTRACT)

    # Sketch002 (on Face20 of Pad) → Pad001 (join)
    with BuildSketch(Plane.XY.offset(3)):
        with BuildLine():
            ThreePointArc((30.712315, 0), (41.547219, 60), (30.712315, 120))
            Line((30.712315, 120), (27.712315, 120))
            ThreePointArc((27.712315, 2), (39.40543, 61), (27.712315, 120))
            Line((0, 2), (27.712315, 2))
            Line((0, 0), (0, 2))
            Line((30.712315, 0), (0, 0))
        make_face()
    extrude(amount=PAD001_DEPTH)

    # Sketch001 (on Face33 of Pad001) → Pad002 (join)
    with BuildSketch(Plane.XY.offset(43)):
        with BuildLine():
            Line((10, 15), (0, 15))
            Line((0, 15), (0, 0))
            Line((0, 0), (30.712315, 0))
            ThreePointArc((30.712315, 0), (41.547219, 60), (30.712315, 120))
            Line((30.712315, 120), (21.18034, 120))
            ThreePointArc((21.18034, 120), (-0.606586, 120.606617), (-3.3e-05, 98.81969))
            ThreePointArc((25, 30), (18.168448, 66.46902), (-3.3e-05, 98.81969))
            ThreePointArc((10, 15), (20.606602, 19.393398), (25, 30))
        make_face()
        with Locations((10, 110)):
            Circle(SKETCH001_R, mode=Mode.SUBTRACT)
    extrude(amount=PAD002_DEPTH)

    # Sketch004 (on Face32 of Pad002) → Pocket001 (cut)
    with BuildSketch(Plane.XZ):
        with Locations((10, 23)):
            Circle(SKETCH004_R)
        with Locations((10, 35)):
            Circle(SKETCH004_R_2)
        with Locations((10, 11)):
            Circle(SKETCH004_R_2)
    extrude(amount=-POCKET001_DEPTH, mode=Mode.SUBTRACT)

    # Sketch005 (on Face4 of Pocket001) → Pocket002 (cut)
    with BuildSketch(Plane(origin=(0, 0, 0), x_dir=(1, 0, 0), z_dir=(0, 0, -1))):
        with Locations((10, -110)):
            Circle(SKETCH005_R)
    extrude(amount=-POCKET002_DEPTH, mode=Mode.SUBTRACT)


solid = part.part
